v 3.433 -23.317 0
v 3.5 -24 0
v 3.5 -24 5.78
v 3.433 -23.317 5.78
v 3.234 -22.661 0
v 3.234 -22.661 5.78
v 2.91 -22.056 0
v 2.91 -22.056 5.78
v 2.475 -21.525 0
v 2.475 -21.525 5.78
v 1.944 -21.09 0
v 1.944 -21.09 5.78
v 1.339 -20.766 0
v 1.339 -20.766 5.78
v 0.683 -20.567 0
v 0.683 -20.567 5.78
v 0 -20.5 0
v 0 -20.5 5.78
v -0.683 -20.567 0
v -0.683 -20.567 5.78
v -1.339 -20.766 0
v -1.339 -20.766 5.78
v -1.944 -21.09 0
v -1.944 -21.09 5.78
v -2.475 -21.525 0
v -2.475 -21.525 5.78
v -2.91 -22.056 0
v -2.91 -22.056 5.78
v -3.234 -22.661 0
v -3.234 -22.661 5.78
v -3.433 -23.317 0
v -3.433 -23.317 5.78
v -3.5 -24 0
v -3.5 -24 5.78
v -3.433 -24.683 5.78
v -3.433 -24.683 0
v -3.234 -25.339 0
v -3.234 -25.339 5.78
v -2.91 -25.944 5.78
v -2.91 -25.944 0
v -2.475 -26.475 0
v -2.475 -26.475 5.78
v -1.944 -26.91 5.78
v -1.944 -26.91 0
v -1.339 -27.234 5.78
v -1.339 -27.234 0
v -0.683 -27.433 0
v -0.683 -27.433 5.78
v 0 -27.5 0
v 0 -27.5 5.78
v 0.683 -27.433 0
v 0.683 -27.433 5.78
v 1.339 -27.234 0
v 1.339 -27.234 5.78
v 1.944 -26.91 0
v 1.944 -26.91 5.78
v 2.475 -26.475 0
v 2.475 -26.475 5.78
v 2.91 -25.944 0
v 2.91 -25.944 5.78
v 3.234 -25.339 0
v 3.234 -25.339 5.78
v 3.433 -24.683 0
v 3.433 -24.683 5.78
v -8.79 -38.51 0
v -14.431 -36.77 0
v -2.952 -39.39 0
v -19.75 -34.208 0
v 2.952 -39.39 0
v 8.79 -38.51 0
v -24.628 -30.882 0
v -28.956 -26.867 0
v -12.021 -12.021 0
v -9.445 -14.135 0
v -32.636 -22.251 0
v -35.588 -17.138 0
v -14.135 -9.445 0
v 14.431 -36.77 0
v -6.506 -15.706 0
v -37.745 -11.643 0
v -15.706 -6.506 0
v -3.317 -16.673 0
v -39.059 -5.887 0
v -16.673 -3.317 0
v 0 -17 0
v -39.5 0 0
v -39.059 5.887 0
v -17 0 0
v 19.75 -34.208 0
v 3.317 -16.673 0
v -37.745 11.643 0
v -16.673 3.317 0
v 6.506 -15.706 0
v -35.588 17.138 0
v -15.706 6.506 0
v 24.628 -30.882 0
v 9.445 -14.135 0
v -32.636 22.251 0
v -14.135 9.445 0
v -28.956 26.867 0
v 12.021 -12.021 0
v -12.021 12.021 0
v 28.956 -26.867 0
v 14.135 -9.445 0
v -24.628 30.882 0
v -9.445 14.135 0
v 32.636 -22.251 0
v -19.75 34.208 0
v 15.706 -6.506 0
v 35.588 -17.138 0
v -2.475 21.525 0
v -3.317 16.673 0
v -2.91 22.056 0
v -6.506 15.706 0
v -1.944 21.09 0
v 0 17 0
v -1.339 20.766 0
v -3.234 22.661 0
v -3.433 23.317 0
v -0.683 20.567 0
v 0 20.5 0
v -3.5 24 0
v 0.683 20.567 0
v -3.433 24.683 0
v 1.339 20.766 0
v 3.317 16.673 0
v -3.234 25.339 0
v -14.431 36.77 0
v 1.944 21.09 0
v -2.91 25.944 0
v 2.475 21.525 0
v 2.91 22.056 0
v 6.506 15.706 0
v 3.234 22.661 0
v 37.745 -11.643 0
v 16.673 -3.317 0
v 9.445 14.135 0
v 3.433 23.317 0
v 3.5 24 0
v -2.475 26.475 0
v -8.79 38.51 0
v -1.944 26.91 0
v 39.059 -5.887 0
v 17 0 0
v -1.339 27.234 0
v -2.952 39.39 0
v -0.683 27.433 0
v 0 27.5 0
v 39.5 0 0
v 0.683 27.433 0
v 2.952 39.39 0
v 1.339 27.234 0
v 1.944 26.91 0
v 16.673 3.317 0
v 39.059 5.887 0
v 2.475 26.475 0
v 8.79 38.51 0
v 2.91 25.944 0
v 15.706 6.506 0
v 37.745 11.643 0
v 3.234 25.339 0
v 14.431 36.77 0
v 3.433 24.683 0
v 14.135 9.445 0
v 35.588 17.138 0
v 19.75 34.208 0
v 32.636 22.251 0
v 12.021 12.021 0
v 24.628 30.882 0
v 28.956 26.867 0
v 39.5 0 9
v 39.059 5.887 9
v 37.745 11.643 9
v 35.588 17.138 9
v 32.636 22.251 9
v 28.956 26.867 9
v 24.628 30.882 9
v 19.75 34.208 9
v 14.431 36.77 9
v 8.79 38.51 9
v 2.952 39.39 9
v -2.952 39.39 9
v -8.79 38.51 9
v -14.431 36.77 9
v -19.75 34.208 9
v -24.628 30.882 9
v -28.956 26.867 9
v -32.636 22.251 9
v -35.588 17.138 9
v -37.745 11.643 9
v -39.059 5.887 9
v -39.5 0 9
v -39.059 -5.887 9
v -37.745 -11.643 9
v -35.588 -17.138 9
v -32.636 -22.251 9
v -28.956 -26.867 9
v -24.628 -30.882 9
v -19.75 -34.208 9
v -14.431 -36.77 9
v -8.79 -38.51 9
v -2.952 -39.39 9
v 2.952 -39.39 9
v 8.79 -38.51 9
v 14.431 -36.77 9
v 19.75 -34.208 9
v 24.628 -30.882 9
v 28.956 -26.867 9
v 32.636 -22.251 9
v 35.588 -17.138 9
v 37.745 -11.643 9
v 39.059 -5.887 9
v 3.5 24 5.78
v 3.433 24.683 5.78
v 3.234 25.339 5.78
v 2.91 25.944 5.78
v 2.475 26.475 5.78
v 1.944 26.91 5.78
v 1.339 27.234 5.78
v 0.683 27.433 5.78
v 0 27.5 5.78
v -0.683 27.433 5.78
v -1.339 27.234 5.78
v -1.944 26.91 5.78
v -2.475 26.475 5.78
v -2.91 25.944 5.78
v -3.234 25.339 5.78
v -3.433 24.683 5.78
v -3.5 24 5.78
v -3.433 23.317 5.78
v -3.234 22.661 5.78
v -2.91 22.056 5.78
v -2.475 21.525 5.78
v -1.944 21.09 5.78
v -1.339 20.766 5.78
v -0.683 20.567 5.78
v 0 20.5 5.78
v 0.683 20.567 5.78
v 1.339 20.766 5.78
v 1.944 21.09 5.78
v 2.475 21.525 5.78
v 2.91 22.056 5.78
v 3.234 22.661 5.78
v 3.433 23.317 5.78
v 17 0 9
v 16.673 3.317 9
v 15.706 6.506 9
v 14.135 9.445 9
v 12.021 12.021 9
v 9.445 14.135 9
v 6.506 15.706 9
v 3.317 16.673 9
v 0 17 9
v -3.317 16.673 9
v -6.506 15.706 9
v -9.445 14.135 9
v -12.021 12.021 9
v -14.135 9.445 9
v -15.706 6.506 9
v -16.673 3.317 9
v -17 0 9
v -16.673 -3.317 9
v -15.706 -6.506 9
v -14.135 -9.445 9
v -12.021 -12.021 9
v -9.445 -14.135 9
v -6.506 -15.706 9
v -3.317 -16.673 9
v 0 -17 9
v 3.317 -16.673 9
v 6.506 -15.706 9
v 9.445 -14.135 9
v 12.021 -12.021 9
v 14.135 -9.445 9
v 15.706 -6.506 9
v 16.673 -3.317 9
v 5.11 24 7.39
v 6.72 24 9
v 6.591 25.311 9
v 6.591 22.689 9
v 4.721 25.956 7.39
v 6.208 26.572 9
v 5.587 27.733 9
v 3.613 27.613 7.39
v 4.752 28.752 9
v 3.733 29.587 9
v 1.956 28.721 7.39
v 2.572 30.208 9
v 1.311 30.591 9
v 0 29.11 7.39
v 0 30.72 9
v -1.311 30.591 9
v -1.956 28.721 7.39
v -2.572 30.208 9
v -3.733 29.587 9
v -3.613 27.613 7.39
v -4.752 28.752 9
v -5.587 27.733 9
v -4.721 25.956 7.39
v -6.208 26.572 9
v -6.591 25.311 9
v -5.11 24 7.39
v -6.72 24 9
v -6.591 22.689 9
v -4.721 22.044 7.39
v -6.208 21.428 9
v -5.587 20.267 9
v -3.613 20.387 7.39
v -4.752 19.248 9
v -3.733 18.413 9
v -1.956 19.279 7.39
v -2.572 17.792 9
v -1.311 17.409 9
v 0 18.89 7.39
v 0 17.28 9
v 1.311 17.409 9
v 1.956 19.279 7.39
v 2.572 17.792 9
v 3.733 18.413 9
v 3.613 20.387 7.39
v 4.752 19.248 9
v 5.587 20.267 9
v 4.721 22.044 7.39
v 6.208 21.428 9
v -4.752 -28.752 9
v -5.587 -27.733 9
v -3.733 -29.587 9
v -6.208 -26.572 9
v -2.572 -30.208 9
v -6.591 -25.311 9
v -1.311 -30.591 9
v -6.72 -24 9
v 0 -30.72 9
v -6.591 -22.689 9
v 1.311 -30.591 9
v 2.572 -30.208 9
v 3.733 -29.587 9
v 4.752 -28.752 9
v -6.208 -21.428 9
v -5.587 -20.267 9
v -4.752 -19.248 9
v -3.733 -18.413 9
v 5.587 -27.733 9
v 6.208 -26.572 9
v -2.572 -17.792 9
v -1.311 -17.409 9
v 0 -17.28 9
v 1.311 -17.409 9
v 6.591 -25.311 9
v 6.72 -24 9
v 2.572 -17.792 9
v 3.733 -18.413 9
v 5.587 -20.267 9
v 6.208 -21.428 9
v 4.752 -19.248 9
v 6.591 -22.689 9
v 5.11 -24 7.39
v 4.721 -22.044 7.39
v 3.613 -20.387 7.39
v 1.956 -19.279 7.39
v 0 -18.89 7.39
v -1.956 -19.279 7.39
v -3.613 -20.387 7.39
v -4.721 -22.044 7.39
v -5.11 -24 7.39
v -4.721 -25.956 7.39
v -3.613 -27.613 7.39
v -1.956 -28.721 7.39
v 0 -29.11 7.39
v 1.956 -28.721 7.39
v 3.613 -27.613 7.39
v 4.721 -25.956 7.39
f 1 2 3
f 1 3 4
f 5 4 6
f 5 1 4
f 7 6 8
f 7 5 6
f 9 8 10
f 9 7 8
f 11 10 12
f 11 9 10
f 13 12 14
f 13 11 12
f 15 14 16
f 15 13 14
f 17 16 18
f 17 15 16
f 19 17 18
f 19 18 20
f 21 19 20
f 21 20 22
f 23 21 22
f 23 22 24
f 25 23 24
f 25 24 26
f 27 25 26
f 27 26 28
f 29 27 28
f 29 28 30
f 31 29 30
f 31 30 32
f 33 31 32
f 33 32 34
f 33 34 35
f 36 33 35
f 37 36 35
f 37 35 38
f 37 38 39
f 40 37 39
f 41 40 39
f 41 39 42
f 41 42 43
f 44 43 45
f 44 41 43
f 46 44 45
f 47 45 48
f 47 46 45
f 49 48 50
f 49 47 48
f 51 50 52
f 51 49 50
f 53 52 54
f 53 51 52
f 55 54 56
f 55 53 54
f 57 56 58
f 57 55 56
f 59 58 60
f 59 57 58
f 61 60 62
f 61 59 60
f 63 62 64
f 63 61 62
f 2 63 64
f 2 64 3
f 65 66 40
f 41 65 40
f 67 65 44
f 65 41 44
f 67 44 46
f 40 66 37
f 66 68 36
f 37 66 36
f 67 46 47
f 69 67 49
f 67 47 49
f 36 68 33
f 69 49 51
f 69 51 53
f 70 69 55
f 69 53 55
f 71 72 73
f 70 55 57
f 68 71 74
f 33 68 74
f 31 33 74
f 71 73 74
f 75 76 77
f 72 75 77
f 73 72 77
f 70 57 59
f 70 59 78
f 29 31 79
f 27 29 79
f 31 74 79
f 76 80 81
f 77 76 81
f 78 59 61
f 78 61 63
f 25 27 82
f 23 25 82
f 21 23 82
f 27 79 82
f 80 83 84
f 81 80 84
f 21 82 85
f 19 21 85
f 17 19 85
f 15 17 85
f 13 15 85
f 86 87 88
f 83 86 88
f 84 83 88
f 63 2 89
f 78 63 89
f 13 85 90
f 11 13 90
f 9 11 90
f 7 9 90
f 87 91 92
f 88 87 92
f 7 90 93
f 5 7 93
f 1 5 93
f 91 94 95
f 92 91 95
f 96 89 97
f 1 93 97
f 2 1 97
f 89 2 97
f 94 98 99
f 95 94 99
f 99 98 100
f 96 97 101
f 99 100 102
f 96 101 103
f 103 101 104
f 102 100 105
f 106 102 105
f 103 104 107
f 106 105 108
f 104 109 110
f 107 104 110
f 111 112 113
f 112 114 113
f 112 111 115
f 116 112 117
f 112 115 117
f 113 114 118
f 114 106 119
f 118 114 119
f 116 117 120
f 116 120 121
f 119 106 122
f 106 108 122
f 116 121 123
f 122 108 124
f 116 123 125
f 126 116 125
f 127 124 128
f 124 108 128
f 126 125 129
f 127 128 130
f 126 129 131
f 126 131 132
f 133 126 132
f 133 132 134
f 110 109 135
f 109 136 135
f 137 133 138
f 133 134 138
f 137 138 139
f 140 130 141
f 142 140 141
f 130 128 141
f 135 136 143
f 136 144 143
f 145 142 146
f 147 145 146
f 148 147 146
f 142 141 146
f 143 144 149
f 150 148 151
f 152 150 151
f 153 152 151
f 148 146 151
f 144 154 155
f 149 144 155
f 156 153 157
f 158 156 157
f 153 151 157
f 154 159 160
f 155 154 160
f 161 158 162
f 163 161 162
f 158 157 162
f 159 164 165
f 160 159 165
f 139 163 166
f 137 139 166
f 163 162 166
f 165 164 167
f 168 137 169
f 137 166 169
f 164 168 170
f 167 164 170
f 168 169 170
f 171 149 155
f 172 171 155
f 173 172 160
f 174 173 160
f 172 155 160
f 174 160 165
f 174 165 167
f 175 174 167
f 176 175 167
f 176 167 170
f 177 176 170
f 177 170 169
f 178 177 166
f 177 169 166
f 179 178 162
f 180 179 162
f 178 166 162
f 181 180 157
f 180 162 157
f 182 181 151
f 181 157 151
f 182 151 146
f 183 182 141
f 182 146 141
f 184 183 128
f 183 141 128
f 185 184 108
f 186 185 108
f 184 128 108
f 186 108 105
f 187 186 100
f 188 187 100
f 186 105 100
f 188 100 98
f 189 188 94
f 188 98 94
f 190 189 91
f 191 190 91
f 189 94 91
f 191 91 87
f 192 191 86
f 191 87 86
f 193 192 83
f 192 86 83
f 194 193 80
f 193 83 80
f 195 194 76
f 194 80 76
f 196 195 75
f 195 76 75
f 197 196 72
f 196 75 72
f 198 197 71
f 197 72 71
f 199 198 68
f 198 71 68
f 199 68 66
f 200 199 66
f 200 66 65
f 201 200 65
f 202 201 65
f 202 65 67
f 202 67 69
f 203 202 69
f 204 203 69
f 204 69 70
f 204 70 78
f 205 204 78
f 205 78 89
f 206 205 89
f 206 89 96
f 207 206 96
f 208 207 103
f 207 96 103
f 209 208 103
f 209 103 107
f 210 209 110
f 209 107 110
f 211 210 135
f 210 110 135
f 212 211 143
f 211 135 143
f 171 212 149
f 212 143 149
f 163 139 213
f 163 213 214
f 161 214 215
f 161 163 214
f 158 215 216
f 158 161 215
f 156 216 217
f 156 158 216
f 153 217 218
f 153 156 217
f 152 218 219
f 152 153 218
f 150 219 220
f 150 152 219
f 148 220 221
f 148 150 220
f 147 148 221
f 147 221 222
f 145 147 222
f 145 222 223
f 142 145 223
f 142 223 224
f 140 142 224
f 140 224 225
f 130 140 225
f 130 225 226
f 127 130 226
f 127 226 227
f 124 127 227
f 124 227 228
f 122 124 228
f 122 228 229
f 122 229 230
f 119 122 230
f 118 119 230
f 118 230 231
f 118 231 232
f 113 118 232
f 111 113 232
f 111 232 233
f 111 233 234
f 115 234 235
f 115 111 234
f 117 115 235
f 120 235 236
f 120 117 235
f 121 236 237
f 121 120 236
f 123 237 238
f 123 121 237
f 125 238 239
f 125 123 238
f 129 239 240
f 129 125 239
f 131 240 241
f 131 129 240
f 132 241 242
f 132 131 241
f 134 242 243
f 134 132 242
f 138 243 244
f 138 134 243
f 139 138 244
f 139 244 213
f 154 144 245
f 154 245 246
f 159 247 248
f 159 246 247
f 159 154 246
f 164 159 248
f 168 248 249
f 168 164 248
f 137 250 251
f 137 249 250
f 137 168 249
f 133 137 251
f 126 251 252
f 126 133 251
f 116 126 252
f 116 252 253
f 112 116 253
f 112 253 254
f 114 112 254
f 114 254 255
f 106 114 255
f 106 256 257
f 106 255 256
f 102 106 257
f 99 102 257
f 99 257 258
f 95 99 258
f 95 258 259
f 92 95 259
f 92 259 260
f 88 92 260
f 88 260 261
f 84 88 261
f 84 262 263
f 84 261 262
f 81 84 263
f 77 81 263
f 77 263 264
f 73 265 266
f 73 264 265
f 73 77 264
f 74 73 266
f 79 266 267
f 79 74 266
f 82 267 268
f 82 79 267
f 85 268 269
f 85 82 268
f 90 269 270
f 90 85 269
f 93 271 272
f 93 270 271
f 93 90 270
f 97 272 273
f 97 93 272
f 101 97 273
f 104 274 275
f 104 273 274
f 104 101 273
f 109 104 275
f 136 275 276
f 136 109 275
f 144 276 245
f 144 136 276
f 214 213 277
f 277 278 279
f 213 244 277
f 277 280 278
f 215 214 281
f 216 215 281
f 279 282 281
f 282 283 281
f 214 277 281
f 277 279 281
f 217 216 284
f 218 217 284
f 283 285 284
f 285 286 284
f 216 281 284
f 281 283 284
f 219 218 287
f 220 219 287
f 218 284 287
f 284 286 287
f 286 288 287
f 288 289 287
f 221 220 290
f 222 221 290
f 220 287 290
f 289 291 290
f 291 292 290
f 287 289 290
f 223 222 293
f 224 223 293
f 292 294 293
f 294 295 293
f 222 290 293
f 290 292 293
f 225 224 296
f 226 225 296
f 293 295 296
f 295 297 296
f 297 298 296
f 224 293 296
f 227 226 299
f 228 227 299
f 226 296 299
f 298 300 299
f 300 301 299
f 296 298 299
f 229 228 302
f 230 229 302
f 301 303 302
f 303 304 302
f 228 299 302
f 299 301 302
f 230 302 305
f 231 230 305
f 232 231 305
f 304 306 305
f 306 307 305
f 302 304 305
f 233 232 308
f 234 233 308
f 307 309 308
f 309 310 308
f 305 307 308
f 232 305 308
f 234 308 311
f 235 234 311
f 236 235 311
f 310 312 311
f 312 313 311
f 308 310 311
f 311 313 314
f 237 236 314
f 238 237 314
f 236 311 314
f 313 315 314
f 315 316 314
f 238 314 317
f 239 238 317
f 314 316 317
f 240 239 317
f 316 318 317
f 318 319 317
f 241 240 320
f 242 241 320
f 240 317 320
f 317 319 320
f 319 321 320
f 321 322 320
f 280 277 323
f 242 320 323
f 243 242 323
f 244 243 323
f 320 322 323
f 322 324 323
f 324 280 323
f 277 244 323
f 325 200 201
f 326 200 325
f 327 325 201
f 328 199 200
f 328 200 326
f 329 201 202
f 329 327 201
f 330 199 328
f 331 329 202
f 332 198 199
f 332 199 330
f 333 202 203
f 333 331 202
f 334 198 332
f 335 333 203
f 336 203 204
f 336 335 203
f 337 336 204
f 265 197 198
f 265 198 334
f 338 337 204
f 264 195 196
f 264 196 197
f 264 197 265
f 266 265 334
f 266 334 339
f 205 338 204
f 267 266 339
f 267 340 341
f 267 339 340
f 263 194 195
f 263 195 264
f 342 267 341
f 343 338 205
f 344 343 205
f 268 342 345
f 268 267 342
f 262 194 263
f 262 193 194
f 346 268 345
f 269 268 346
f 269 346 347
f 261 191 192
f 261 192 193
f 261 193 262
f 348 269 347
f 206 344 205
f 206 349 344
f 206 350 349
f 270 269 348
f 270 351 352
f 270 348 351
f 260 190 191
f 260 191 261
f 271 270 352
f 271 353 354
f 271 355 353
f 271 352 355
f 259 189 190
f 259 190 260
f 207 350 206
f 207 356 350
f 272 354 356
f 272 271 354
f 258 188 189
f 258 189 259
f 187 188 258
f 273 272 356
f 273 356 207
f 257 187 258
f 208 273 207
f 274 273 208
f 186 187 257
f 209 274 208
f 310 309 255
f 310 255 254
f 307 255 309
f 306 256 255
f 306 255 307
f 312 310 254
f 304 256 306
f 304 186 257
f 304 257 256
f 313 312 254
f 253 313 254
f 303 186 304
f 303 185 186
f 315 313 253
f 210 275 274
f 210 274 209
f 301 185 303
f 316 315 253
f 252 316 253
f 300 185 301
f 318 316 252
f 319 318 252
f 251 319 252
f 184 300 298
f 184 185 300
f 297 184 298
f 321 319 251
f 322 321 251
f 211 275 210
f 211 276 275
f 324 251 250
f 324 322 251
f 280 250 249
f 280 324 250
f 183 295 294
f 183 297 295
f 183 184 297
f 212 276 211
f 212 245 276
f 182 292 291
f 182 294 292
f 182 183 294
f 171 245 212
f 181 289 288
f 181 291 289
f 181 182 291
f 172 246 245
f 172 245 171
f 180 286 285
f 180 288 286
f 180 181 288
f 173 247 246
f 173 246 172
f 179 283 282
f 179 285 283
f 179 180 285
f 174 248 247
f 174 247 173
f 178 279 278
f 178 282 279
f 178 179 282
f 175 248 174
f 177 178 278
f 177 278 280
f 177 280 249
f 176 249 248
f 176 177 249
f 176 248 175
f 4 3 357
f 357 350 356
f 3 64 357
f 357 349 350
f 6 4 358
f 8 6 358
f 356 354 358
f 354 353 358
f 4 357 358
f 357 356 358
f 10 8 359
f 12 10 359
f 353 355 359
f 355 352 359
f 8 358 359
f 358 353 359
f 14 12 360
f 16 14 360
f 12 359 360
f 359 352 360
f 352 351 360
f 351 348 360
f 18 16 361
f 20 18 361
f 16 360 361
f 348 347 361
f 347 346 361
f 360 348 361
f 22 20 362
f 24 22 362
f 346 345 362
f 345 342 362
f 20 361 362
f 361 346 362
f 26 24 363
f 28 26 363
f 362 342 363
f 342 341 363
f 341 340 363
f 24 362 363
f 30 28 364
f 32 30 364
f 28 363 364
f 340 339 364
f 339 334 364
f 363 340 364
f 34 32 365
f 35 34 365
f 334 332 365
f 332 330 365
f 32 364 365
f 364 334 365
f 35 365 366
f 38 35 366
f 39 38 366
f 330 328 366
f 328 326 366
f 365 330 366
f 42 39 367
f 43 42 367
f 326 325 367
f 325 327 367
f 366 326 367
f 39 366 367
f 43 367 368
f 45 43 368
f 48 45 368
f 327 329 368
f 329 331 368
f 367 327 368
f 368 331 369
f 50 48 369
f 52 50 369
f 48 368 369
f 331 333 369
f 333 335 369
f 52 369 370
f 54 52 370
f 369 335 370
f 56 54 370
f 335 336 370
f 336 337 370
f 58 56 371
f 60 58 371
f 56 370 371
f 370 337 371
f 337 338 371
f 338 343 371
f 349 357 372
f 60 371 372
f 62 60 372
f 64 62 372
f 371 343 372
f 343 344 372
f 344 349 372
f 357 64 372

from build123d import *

# Parameters (mm, degrees)
SKETCH_1_R                    = 39.5
EXTRUDE_1_DEPTH               = 9
CUT_EXTRUDE_1_DEPTH           = 57.581799194
CUT_EXTRUDE_1_DEPTH_BACK      = 57.581799194
SKETCH_2_R                    = 17
SKETCH_2_R_2                  = 3.5
SKETCH_3_R                    = 6.72
CUT_EXTRUDE_2_DEPTH           = 3.22
CUT_EXTRUDE_2_DRAFT           = -45
CUT_EXTRUDE_2_PROFILE_2_DEPTH = 3.22
CUT_EXTRUDE_2_PROFILE_2_DRAFT = -45


with BuildPart() as part:
    # ｽｹｯﾁ1 → ﾎﾞｽ - 押し出し1 (new body)
    with BuildSketch(Plane.XY):
        Circle(SKETCH_1_R)
    extrude(amount=EXTRUDE_1_DEPTH)

    # ｽｹｯﾁ2 → ｶｯﾄ - 押し出し1 (cut, two sides: drawn at the far end of the back side and taken through both)
    with BuildSketch(Plane.XY.offset(-CUT_EXTRUDE_1_DEPTH_BACK)):
        Circle(SKETCH_2_R)
        with Locations((0, 24)):
            Circle(SKETCH_2_R_2)
        with Locations((0, -24)):
            Circle(SKETCH_2_R_2)
    extrude(amount=CUT_EXTRUDE_1_DEPTH + CUT_EXTRUDE_1_DEPTH_BACK, mode=Mode.SUBTRACT)


with BuildPart() as cut_extrude_2_tool:
    # ｽｹｯﾁ3 → ｶｯﾄ - 押し出し2 (with draft: the straight prism first)
    with BuildSketch(Plane.XY.offset(9)):
        with Locations((0, 24)):
            Circle(SKETCH_3_R)
    extrude(amount=-CUT_EXTRUDE_2_DEPTH)
    # ｶｯﾄ - 押し出し2: the draft: its side faces are tilted about the plane it starts from
    cut_extrude_2_sides = [cut_extrude_2_tool.faces().sort_by_distance(p)[0] for p in [
        (-6.72, 24, 7.39),
    ]]
    draft(cut_extrude_2_sides, Plane.XY.offset(9), CUT_EXTRUDE_2_DRAFT)


with BuildPart() as part_1:
    add(part.part)

    # ｶｯﾄ - 押し出し2: cut by cut_extrude_2_tool
    add(cut_extrude_2_tool.part, mode=Mode.SUBTRACT)


with BuildPart() as cut_extrude_2_profile_2_tool:
    # ｽｹｯﾁ3 → ｶｯﾄ - 押し出し2 profile 2 (with draft: the straight prism first)
    with BuildSketch(Plane.XY.offset(9)):
        with Locations((0, -24)):
            Circle(SKETCH_3_R)
    extrude(amount=-CUT_EXTRUDE_2_PROFILE_2_DEPTH)
    # ｶｯﾄ - 押し出し2 profile 2: the draft: its side faces are tilted about the plane it starts from
    cut_extrude_2_profile_2_sides = [cut_extrude_2_profile_2_tool.faces().sort_by_distance(p)[0] for p in [
        (-6.72, -24, 7.39),
    ]]
    draft(cut_extrude_2_profile_2_sides, Plane.XY.offset(9), CUT_EXTRUDE_2_PROFILE_2_DRAFT)


with BuildPart() as part_2:
    add(part_1.part)

    # ｶｯﾄ - 押し出し2 profile 2: cut by cut_extrude_2_profile_2_tool
    add(cut_extrude_2_profile_2_tool.part, mode=Mode.SUBTRACT)


solid = part_2.part
